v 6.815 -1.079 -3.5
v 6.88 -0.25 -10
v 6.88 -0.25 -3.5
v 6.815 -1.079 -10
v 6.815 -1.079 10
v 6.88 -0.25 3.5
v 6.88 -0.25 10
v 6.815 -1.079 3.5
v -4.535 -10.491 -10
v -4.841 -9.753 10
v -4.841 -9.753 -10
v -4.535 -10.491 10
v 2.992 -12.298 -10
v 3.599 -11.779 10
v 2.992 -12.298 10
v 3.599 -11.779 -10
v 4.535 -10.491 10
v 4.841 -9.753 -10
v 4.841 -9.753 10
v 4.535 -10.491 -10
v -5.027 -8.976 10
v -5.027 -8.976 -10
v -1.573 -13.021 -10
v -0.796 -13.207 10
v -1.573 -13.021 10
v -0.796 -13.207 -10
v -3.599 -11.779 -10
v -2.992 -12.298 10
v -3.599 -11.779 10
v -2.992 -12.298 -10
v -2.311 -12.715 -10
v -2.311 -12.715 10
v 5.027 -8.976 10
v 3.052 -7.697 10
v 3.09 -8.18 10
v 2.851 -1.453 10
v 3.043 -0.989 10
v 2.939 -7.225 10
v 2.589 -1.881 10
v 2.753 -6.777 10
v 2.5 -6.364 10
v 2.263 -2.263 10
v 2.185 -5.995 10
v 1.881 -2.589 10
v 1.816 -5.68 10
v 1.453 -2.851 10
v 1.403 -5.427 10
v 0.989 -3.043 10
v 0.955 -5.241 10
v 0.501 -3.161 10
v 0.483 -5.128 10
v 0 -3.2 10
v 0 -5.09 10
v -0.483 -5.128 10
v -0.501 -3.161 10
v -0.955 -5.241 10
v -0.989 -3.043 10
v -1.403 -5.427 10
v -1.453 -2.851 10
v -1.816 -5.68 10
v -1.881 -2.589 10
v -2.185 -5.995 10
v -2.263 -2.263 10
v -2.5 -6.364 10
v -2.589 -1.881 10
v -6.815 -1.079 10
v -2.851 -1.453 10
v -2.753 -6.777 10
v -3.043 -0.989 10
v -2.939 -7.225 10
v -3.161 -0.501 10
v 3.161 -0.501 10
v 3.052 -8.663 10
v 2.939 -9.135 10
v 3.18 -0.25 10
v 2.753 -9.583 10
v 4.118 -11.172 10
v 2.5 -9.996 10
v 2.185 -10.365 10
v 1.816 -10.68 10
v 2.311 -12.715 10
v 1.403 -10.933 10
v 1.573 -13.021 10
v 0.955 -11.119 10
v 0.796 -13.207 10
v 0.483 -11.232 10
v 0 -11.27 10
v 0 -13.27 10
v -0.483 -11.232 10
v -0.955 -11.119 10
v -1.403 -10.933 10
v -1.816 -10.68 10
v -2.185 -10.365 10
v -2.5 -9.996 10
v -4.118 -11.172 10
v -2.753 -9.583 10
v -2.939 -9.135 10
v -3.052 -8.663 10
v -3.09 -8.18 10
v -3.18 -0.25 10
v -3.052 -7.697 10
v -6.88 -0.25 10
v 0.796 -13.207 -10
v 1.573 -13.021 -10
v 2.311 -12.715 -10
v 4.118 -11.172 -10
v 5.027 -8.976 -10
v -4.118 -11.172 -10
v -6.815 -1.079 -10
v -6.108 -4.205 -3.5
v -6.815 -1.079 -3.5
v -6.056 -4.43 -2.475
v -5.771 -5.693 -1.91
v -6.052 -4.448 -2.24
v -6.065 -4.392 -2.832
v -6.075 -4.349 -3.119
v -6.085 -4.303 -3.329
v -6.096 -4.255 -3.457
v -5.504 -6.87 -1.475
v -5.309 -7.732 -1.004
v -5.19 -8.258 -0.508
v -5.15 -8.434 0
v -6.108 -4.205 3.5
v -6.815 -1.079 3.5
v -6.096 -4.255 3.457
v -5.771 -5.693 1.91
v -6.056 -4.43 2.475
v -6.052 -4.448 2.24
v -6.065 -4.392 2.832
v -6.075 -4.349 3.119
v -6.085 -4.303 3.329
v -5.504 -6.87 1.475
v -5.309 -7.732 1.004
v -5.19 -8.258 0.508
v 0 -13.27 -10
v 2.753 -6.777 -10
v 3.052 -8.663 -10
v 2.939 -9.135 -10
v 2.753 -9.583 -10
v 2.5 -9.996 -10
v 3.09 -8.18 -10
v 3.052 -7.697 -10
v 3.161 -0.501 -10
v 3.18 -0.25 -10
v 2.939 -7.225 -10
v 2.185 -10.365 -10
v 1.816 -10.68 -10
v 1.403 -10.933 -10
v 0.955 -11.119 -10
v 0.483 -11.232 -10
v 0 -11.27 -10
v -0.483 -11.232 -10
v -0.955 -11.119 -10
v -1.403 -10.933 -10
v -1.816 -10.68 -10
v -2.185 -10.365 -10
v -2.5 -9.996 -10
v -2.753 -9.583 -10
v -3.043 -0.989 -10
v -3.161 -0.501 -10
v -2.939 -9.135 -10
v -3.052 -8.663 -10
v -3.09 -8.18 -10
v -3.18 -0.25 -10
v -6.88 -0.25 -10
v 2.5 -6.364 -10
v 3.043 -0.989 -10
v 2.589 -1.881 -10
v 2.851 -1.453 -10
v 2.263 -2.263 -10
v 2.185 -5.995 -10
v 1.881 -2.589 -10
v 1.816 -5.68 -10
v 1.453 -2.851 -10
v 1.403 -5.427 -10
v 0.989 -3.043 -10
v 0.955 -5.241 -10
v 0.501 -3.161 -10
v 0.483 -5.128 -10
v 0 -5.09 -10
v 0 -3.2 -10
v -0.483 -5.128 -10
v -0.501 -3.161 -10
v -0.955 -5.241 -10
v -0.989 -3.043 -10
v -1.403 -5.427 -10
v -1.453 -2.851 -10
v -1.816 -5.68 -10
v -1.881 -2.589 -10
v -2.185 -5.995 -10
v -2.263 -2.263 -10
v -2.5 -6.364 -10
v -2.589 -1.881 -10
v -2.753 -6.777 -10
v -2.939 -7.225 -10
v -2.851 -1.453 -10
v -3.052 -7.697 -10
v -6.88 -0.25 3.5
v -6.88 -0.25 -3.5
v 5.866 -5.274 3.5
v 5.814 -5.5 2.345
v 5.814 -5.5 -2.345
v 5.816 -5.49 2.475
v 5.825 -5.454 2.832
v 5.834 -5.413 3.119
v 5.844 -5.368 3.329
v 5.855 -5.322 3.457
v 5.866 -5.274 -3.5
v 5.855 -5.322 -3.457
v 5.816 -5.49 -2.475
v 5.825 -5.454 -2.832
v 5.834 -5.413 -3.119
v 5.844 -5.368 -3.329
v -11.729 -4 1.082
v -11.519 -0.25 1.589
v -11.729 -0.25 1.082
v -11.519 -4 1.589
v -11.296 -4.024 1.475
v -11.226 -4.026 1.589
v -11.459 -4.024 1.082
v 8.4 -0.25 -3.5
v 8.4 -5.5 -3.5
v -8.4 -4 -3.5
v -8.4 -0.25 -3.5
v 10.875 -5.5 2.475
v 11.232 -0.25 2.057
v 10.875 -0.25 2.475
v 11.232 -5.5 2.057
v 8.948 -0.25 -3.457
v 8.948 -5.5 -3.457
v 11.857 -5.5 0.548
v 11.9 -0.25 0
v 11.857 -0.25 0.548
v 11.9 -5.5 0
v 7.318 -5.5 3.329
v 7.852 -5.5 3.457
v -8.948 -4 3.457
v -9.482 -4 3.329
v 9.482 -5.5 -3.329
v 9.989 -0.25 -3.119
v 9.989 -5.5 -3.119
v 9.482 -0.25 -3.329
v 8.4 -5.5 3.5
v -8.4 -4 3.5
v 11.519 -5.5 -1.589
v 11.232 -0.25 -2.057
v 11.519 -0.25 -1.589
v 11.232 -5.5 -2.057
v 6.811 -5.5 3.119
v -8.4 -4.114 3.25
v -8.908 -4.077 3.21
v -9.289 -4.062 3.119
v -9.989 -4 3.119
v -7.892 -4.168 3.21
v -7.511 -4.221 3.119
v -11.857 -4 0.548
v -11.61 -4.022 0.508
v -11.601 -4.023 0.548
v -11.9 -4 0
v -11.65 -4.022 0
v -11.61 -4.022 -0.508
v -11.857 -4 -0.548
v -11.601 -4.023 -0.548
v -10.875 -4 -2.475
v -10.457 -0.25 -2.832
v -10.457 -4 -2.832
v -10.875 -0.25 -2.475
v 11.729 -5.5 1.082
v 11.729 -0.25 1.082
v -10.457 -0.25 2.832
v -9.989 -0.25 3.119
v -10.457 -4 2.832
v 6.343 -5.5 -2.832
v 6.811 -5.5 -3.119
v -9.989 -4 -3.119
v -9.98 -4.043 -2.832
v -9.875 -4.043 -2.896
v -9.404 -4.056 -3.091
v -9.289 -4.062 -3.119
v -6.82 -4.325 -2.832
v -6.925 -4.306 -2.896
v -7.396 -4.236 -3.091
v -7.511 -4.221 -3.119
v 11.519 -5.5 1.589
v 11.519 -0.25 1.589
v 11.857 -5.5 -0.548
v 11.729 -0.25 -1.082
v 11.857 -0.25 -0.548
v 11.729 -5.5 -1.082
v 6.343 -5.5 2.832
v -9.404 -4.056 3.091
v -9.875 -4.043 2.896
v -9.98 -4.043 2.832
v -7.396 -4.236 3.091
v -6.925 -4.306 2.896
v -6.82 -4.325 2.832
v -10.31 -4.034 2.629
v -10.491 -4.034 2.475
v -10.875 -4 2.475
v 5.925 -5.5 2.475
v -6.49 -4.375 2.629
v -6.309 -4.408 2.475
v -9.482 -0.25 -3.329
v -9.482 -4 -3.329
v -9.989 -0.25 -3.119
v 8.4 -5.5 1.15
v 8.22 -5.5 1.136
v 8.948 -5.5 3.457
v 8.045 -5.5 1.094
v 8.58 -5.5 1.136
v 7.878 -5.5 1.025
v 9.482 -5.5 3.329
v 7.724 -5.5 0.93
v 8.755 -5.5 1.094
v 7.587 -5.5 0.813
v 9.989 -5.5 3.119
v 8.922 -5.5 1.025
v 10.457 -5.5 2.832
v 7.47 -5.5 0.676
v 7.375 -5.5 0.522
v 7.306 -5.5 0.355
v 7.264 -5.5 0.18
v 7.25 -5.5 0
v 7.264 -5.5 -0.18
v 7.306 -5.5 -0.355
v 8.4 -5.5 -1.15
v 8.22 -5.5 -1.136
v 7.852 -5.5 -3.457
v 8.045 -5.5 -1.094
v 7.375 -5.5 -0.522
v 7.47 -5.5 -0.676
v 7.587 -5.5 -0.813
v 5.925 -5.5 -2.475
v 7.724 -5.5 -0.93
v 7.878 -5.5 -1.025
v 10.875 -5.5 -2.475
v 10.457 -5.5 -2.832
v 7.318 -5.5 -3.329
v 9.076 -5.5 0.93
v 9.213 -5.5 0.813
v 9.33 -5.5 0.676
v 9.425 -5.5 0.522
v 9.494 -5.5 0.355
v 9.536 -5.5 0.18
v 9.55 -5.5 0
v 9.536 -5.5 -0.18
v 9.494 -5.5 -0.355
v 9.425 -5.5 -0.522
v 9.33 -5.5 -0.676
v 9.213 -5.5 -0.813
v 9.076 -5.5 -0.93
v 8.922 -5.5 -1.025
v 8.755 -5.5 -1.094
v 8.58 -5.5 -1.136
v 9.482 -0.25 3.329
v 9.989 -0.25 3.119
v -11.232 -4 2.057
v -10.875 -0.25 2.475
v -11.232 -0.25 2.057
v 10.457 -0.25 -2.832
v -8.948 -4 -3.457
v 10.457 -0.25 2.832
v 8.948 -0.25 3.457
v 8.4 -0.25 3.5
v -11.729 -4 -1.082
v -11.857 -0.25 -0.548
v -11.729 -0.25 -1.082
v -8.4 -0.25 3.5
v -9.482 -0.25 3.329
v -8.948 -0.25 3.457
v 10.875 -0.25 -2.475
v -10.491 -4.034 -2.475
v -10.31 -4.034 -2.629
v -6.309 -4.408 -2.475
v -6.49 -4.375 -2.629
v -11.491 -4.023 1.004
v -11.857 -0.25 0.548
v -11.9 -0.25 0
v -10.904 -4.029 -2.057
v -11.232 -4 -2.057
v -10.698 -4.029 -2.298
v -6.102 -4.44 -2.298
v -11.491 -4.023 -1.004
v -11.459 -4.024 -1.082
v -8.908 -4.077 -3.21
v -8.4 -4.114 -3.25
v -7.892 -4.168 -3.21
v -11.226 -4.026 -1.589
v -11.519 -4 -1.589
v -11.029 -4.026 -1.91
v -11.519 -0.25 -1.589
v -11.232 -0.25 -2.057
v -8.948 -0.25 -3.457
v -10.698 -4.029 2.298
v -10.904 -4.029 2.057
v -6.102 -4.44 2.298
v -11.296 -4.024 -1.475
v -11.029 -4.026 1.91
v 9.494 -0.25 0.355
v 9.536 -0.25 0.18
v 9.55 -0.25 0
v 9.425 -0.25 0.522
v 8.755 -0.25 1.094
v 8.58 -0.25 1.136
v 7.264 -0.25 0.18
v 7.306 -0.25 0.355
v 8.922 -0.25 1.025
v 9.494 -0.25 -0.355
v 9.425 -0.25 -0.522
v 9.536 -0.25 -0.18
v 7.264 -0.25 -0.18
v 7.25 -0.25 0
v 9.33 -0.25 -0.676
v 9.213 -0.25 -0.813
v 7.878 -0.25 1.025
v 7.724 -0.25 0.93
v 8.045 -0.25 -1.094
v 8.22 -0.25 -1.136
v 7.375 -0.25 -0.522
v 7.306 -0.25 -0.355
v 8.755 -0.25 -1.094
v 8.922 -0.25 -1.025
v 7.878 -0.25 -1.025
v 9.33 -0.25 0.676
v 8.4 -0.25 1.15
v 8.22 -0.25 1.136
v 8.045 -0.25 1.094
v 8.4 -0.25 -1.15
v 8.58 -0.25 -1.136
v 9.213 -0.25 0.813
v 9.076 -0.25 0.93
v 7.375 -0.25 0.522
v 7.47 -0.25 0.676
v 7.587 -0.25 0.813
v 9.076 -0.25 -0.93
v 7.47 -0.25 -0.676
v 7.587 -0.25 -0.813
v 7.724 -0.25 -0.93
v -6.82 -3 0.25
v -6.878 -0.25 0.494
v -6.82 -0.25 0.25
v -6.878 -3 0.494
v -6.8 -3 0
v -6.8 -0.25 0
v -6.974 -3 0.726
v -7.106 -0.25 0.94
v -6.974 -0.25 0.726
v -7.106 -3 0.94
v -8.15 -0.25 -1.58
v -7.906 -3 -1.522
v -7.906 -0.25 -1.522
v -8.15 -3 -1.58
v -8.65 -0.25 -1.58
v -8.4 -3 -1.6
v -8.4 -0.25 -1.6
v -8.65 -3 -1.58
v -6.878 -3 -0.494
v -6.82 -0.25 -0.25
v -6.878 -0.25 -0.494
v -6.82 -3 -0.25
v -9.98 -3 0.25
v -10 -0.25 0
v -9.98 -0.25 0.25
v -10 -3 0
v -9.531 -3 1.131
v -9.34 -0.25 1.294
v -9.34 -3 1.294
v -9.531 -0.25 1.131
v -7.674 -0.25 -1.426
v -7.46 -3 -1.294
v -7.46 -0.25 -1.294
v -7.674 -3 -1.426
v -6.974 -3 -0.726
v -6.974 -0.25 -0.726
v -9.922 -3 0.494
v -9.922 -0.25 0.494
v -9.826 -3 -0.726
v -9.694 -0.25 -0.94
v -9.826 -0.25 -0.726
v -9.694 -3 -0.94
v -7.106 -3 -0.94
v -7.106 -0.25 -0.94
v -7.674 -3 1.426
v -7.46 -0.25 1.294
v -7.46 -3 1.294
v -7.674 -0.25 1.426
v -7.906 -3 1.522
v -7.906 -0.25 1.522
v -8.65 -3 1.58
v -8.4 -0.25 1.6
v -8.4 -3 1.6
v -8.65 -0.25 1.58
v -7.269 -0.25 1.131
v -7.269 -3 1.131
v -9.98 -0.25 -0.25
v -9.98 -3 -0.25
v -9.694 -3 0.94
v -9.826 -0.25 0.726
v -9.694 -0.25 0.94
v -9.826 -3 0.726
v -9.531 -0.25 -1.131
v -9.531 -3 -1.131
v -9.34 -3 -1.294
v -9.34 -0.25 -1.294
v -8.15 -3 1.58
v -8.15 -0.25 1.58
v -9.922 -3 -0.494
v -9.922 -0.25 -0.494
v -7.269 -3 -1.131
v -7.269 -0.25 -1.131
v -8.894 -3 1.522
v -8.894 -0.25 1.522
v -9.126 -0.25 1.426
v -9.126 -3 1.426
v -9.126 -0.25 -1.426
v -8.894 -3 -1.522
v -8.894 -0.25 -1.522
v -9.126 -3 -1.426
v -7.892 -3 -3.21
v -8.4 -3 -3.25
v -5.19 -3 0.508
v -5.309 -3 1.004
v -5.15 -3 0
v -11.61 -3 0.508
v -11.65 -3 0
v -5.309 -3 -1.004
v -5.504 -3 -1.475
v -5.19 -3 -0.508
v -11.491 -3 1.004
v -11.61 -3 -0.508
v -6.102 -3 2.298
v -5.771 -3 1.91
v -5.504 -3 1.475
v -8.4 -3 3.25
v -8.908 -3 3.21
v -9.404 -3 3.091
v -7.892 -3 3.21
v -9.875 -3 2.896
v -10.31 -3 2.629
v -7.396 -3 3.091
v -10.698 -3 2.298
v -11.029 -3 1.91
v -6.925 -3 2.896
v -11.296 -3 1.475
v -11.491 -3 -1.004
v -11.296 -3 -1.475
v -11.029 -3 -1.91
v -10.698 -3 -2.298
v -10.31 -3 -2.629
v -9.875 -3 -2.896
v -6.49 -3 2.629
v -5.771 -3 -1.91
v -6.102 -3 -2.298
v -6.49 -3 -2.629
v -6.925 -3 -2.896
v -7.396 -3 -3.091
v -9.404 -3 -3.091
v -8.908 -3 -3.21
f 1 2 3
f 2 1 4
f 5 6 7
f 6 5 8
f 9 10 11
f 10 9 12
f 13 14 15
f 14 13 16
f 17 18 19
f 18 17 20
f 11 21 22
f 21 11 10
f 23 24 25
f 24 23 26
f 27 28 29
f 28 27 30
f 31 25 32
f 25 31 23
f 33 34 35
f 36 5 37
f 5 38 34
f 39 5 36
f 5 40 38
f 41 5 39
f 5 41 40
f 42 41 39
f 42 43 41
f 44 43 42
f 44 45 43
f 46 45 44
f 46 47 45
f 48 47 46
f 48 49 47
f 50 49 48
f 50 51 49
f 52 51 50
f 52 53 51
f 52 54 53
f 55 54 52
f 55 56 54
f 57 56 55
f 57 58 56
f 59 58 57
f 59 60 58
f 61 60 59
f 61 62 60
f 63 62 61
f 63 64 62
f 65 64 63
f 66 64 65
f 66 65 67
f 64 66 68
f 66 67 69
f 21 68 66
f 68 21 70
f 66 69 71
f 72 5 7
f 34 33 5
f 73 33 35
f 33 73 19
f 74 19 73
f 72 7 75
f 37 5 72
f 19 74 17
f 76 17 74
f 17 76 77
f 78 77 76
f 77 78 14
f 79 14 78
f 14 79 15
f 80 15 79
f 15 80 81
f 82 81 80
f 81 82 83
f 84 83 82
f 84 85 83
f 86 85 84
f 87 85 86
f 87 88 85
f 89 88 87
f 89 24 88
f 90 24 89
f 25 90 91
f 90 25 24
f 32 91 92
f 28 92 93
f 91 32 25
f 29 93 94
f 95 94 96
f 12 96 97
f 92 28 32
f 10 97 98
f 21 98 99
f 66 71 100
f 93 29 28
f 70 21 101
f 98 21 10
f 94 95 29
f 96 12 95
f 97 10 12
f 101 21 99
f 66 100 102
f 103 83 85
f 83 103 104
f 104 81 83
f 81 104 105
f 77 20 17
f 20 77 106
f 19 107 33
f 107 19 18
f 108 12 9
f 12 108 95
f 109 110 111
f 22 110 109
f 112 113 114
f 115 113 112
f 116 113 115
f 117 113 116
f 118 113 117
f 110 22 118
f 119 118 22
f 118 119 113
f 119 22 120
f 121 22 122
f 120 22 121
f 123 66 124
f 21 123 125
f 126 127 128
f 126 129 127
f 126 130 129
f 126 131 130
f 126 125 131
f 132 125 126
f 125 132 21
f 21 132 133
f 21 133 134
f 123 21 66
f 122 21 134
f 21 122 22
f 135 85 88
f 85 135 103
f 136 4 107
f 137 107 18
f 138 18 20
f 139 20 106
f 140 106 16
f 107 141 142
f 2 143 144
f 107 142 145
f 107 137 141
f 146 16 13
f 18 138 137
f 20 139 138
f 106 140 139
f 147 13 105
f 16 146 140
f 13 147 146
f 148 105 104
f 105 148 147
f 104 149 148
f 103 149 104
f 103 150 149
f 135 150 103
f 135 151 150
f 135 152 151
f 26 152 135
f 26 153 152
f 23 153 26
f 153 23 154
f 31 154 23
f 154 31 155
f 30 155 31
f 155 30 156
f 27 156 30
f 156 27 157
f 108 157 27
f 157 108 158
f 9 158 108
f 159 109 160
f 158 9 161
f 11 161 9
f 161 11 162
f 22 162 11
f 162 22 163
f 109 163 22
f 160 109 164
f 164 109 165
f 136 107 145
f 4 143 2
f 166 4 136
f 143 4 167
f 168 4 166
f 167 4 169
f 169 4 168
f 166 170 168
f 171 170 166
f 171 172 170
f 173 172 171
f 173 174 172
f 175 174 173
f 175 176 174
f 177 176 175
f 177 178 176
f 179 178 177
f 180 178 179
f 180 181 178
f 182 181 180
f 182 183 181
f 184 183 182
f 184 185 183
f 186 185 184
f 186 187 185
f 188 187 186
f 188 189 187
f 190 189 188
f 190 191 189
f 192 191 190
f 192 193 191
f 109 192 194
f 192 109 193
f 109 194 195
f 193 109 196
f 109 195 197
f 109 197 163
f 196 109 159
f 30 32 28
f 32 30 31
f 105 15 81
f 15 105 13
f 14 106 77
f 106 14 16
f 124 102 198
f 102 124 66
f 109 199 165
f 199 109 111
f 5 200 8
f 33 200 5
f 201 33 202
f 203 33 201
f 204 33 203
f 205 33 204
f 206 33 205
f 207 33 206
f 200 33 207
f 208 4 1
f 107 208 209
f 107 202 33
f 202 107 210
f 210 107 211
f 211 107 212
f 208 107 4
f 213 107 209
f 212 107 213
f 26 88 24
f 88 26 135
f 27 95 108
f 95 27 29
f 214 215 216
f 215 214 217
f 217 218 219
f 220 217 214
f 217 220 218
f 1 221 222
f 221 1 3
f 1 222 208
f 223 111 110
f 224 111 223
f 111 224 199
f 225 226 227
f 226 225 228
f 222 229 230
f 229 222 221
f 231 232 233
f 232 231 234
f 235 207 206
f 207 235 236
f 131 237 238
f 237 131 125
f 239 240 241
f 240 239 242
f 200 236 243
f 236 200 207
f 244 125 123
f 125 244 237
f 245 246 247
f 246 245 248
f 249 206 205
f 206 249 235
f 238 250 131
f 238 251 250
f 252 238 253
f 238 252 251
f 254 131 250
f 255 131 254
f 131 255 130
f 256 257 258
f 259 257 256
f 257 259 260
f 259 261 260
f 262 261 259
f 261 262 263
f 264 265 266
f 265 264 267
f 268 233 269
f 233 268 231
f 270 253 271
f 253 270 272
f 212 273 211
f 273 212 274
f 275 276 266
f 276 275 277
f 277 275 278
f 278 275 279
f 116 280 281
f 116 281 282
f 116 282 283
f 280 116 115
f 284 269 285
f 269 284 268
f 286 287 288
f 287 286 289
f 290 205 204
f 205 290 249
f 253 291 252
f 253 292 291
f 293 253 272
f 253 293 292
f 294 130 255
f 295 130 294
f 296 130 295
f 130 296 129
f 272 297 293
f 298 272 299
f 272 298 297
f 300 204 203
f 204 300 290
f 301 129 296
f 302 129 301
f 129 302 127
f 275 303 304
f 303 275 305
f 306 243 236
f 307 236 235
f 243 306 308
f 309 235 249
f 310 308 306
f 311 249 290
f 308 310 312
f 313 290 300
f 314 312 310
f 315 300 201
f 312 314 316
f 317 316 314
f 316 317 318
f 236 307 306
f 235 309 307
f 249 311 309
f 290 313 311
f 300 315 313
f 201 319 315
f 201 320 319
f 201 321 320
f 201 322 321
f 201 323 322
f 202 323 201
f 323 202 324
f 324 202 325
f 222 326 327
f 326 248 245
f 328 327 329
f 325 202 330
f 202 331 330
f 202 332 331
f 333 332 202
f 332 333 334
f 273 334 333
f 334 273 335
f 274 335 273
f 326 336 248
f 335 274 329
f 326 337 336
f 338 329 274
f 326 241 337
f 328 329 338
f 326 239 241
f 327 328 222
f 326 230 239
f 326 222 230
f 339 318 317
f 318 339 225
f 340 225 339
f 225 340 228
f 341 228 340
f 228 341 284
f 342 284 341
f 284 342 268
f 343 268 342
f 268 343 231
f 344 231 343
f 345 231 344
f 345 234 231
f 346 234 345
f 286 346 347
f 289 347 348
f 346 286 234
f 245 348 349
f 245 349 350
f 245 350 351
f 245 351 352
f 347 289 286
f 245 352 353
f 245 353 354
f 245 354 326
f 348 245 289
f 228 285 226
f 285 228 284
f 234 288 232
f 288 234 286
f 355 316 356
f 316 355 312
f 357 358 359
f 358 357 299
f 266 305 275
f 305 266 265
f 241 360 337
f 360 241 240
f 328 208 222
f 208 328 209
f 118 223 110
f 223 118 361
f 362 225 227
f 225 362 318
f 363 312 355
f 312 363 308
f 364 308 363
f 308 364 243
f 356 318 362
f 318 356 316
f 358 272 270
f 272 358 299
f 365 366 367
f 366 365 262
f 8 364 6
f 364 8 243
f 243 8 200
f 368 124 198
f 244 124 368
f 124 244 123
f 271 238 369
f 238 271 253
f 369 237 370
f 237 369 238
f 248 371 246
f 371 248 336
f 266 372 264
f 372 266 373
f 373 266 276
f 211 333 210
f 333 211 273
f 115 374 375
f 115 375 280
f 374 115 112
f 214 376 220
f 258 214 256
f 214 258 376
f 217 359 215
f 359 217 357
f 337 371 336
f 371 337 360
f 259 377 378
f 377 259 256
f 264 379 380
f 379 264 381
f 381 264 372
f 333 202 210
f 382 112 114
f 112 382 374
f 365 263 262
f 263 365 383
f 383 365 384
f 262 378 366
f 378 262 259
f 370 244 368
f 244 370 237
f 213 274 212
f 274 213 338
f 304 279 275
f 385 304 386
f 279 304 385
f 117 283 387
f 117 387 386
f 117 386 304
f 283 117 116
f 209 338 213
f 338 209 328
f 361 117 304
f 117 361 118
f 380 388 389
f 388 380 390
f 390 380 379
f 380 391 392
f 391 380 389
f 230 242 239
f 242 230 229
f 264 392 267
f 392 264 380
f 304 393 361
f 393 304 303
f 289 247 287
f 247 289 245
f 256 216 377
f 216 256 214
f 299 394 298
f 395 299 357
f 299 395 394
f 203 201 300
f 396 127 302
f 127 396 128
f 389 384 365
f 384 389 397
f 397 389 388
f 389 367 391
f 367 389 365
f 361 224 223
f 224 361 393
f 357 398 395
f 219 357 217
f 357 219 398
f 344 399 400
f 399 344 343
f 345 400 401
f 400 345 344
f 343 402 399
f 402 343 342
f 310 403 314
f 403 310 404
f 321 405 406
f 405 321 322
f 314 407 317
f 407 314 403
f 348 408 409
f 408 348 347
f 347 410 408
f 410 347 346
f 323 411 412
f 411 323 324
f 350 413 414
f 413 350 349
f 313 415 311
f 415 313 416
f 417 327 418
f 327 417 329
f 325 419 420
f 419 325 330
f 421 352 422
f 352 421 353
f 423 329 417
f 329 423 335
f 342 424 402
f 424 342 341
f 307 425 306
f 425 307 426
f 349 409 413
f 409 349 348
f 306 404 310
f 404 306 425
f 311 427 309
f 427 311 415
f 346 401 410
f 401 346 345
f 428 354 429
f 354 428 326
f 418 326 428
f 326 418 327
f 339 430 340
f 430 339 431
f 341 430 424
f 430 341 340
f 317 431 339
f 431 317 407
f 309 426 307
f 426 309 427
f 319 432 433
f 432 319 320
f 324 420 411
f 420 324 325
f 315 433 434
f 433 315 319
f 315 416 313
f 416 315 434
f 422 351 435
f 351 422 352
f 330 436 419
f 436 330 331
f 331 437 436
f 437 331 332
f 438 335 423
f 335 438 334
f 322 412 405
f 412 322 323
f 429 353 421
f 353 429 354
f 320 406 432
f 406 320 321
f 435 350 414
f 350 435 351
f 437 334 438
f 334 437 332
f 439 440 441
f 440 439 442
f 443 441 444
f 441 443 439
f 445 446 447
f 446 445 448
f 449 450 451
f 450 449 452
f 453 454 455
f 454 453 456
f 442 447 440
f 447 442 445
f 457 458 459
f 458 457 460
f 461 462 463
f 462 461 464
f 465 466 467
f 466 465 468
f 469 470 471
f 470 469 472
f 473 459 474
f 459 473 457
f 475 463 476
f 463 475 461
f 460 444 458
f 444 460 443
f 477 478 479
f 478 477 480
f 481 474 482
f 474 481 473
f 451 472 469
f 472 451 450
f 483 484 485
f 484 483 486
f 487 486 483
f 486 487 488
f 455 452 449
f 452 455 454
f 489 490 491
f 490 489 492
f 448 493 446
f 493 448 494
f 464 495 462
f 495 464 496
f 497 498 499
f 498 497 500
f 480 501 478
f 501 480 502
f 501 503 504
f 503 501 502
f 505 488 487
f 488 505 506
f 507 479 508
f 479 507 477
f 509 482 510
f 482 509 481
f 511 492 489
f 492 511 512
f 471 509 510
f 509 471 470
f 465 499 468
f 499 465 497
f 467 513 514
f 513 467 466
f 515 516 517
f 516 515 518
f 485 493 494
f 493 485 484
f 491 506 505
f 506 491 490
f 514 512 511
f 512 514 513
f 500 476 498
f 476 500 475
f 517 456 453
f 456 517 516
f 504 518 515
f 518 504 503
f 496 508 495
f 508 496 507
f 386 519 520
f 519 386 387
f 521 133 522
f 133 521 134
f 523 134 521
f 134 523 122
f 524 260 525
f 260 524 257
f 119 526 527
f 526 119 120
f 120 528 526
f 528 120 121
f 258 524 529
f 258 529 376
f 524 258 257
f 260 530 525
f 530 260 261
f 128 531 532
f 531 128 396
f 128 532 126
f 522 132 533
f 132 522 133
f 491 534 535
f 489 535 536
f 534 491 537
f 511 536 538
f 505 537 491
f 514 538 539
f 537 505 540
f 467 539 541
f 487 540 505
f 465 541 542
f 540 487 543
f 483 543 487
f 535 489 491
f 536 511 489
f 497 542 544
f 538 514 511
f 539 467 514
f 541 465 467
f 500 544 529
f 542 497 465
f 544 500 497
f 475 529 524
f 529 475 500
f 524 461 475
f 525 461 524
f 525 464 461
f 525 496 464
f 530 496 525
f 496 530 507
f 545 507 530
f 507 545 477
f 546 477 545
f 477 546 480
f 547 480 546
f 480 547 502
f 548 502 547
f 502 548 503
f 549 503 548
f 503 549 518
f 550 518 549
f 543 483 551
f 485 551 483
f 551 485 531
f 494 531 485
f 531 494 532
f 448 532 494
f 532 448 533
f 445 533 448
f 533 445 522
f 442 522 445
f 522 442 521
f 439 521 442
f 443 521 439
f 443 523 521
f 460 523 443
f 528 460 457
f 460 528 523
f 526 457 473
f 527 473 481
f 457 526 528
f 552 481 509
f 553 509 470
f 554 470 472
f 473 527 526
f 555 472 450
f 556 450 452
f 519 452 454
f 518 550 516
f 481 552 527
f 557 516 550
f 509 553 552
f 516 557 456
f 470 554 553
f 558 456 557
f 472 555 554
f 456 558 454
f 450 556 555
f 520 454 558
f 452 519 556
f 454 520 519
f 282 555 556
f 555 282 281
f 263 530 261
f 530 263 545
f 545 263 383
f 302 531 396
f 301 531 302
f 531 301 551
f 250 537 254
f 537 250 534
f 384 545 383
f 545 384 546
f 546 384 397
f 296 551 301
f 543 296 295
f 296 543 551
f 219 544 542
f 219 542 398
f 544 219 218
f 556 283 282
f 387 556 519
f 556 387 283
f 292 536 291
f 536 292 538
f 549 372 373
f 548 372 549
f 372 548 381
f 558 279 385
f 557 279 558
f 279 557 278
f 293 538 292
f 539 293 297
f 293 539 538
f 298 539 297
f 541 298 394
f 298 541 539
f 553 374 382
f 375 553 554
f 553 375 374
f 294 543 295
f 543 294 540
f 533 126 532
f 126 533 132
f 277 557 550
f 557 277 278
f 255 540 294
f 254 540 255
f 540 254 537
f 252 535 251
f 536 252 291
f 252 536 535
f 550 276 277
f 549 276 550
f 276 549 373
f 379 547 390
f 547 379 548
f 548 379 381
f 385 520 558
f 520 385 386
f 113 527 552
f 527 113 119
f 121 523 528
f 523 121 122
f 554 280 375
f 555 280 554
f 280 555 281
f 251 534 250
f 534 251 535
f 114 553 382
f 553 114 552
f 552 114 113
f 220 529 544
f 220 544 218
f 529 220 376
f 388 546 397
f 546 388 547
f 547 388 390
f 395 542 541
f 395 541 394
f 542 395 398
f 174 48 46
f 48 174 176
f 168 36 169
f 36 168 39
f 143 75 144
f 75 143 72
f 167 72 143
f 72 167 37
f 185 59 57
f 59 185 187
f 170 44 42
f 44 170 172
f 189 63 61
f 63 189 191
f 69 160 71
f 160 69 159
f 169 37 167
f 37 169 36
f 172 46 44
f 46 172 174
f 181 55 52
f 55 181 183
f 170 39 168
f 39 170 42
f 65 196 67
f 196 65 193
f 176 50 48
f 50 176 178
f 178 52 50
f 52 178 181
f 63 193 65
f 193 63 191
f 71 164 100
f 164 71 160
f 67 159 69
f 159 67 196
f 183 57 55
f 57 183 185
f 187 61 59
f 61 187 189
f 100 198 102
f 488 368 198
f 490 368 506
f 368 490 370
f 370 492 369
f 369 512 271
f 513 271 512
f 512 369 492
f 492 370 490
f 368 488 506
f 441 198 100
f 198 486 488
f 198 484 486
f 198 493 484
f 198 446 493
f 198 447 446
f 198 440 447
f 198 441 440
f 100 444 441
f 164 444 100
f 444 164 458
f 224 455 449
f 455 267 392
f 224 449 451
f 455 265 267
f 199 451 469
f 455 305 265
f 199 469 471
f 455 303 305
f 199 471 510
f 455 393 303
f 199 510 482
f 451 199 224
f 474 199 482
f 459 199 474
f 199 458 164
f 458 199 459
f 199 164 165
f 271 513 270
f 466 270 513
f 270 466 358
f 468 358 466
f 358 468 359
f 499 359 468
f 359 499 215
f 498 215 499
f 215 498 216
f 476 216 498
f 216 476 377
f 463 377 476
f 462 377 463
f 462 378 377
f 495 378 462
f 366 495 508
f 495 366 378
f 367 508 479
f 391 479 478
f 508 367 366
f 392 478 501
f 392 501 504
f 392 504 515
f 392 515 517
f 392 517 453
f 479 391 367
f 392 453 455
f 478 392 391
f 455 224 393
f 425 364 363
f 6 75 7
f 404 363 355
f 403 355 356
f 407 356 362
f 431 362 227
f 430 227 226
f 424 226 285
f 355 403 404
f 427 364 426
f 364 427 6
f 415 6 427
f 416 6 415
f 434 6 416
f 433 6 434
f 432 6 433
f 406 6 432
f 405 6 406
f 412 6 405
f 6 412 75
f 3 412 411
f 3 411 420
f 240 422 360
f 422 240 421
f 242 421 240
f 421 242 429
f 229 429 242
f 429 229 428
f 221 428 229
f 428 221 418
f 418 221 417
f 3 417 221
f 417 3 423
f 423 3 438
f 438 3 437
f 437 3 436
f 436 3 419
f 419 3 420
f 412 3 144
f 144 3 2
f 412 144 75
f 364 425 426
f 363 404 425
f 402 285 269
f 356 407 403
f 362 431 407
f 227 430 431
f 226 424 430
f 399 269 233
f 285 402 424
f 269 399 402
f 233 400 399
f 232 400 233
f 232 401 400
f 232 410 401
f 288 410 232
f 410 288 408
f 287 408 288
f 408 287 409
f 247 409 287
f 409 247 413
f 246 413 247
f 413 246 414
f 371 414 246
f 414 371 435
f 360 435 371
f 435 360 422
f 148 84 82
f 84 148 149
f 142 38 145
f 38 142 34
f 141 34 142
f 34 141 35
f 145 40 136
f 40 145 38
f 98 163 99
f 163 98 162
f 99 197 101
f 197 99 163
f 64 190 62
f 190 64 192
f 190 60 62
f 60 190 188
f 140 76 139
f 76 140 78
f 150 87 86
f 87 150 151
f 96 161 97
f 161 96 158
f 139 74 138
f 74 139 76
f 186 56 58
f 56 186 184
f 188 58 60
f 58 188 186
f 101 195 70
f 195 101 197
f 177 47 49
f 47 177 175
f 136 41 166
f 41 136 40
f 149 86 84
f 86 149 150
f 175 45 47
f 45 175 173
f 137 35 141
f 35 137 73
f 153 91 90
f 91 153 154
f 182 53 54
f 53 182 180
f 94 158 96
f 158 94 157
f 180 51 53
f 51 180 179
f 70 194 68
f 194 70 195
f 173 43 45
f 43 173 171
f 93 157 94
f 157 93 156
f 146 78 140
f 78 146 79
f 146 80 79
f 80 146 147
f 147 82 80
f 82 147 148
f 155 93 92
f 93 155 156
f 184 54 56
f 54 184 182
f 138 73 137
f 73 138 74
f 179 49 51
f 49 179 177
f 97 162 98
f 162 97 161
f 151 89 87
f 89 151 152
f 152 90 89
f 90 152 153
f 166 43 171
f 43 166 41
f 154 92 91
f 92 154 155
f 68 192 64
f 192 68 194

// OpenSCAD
SPINE=6.4;
TUBE=6.18;
$fn=40;

module clamp() {
    cylinder(d=SPINE*2+1, h=20, center=true);
}

module cylinder_hole(D, H) {
    rotate([90, 0])
        cylinder(d=D, h=H, center=true);
}

module clampies_neg() {
    translate([SPINE+2, -4.5])
        cylinder_hole(2.3, 10);
    translate([-SPINE-2, -2.5])
        cylinder_hole(3.2, 10);
    translate([-SPINE-2, -8])
        cylinder_hole(6.5, 10);
}

module clampies() {    
    hull() {
        translate([SPINE+2, -2.5])
            cylinder_hole(7, 6);

        translate([-SPINE-2, -1.5])
            cylinder_hole(7, 5);
    } 
}

module tube_channel_neg() {
    translate([0, -TUBE-2]) 
        cylinder(d=TUBE, h=30, center=true);
}

module tube_channel() {
    translate([0, -TUBE-2]) 
        cylinder(d=TUBE+4, h=20, center=true);
}

module spine() {
    cylinder(d=SPINE, h=50, center=true);
}

difference() {
    union() {
        hull() {
            clamp();
            //rotate([0, 45]) 
                tube_channel();
        }
        clampies();
    }
    spine();
    
    clampies_neg();
    
    translate([0, 9.75])
        cube([SPINE*2+20, 20, 21], center=true);
    //rotate([0, 45])
        tube_channel_neg();
}
